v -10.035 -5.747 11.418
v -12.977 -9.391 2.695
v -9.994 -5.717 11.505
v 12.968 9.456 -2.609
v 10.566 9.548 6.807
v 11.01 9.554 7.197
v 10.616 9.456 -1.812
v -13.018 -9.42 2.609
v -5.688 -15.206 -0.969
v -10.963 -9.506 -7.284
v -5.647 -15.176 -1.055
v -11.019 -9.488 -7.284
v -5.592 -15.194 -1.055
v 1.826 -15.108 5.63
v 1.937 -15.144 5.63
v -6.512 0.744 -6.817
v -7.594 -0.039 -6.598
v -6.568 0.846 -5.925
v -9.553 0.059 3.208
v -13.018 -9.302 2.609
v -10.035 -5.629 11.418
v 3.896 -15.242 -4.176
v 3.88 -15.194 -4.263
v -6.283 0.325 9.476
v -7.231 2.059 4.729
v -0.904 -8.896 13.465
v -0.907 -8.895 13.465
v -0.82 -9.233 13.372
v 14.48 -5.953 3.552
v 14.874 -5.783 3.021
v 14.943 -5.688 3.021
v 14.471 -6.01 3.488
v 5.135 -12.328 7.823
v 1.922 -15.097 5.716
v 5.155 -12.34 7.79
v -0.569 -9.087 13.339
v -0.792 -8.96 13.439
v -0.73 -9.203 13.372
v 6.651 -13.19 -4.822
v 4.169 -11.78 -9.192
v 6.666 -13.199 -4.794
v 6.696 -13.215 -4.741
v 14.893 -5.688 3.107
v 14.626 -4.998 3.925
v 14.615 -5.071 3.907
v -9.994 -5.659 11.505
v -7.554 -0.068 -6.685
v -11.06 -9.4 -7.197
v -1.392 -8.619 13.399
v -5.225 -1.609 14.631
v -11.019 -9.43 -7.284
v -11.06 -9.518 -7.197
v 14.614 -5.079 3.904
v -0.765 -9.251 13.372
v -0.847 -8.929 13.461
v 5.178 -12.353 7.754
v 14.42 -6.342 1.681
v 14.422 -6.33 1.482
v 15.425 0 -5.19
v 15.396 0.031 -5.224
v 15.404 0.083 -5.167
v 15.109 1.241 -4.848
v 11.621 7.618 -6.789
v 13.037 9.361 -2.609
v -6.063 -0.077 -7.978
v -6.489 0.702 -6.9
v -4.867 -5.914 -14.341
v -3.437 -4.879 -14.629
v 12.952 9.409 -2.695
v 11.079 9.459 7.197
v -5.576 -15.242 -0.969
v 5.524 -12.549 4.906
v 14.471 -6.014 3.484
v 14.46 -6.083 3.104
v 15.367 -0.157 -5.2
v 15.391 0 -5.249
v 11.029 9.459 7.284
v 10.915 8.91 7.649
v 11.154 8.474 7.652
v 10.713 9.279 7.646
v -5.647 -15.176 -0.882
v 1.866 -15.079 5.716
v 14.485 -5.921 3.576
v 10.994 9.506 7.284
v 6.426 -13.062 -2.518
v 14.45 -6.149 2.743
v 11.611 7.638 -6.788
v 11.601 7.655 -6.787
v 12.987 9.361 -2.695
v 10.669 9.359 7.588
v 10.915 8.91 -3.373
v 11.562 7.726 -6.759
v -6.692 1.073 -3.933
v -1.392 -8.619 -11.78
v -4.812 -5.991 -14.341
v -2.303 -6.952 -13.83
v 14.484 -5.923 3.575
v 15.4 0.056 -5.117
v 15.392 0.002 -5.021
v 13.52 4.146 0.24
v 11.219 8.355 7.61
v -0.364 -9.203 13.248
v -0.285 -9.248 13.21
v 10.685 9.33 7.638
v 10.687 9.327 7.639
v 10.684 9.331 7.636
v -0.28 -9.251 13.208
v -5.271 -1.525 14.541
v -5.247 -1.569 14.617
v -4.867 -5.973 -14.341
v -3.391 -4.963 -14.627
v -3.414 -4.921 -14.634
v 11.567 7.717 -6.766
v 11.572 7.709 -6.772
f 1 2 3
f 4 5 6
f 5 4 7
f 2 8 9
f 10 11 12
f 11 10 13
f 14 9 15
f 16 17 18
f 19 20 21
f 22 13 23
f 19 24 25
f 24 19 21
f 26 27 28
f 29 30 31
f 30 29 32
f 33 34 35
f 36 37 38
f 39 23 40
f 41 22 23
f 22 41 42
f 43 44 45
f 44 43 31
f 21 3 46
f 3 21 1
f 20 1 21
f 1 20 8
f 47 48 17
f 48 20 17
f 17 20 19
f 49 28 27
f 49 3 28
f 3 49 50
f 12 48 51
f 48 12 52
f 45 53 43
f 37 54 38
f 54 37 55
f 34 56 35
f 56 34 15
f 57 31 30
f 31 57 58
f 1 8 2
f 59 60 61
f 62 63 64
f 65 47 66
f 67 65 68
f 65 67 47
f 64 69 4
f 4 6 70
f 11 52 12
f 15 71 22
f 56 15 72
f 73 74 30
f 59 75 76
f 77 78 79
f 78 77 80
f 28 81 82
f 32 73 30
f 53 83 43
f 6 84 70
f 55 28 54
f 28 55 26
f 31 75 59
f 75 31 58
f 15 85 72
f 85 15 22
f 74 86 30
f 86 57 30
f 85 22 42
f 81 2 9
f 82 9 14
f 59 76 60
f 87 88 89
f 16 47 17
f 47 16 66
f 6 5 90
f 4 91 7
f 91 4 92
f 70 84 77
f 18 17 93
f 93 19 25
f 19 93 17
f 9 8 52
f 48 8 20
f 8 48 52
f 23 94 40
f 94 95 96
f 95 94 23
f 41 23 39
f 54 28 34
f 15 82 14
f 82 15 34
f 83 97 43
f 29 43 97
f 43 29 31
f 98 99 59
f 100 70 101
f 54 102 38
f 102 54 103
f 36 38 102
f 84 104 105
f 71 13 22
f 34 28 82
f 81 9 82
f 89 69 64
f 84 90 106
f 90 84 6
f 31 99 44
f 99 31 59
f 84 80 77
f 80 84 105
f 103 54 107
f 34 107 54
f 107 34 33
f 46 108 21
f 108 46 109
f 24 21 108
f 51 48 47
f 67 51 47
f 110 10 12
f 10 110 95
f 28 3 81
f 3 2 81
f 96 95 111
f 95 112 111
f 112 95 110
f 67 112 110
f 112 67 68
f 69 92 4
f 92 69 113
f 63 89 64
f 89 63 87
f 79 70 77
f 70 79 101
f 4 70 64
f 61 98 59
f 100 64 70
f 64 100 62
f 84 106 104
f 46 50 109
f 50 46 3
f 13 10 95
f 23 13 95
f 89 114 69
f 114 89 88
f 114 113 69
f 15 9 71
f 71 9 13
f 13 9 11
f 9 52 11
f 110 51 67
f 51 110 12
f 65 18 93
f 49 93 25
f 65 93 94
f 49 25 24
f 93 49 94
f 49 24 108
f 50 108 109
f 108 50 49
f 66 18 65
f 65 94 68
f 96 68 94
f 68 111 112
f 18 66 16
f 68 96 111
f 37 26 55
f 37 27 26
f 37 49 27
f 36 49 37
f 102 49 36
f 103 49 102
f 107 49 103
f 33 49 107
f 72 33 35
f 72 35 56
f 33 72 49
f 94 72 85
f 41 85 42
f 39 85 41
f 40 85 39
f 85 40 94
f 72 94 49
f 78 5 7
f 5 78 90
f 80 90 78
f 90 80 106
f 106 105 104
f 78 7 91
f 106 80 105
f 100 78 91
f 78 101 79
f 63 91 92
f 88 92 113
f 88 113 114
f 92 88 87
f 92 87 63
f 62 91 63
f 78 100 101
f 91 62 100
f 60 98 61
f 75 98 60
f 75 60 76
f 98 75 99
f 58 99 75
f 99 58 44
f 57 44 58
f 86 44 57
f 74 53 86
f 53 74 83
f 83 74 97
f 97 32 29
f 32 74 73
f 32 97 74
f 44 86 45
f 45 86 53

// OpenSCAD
// Auto-generated OpenSCAD file

    inner_points = 10*[[3.624317002584078e-13, 2.953319001906976e-13, 1.618033988749895], [-3.624317002584078e-13, -2.953319001906976e-13, -1.618033988749895], [1.4067368092917045, -0.799453274515584, -1.6918183476653185e-13], [0.799453274515584, 1.4067368092917045, -4.358384739871853e-13], [-0.4563237566115435, 0.834432217941957, 1.3090169943748973], [-0.45632375661213, 0.8344322179414793, -1.3090169943749976], [0.45632375661213, -0.8344322179414793, 1.3090169943749976], [0.4563237566115435, -0.834432217941957, -1.3090169943748973], [0.9504130526801611, 0.03497894342637298, 1.309016994374728], [0.9504130526795745, 0.03497894342589519, -1.3090169943751668], [-0.7383473480718745, 1.350139689937751, 0.49999999999991895], [-0.7383473480720981, 1.3501396899375684, -0.500000000000081], [0.7383473480720981, -1.3501396899375684, 0.500000000000081], [0.7383473480718745, -1.350139689937751, -0.49999999999991895], [1.5378006225876821, 0.056597119354135916, 0.4999999999996452], [1.5378006225874585, 0.056597119353953396, -0.5000000000003548], [0.21206570460806262, 1.3851186333639414, 0.8090169943746471], [0.21206570460770024, 1.3851186333636463, -0.8090169943752478], [1.0814768659759149, 0.8910293372959104, 0.8090169943745426], [1.0814768659755525, 0.8910293372956152, -0.8090169943753523], [-0.8694111613678522, 0.49408929606803104, 1.0456012416478531e-13], [-0.5873875699075214, -0.02161817592776291, 0.809016994375083], [-0.5873875699078839, -0.021618175928058286, -0.8090169943748119], [-0.13106381329575384, -0.8560503938695374, 0.5000000000001856], [-0.13106381329597788, -0.8560503938697199, -0.49999999999981437]];

    outer_points = 10*[[-0.4827045868491299, -0.5943615441771533, -1.4253998124694895], [0.4827045868491299, 0.5943615441771533, 1.4253998124694895], [1.5325422089871936, 0.0, -0.5189878287807413], [0.19064272411334998, -1.5049147296618652, 0.56295736689317], [-1.097875476912321, -0.9458928165929492, -0.7197153641977476], [-0.31684304886495324, 0.01580436349155695, 1.5866299799356127], [0.31684304886495324, -0.01580436349155695, -1.5866299799356127], [1.097875476912321, 0.9458928165929492, 0.7197153641977476], [0.43466673207487266, -0.9458928165929492, -1.2387031929784889], [1.2156991601222404, 0.01580436349155695, 1.0676421511548713], [-1.2936952502100056, -0.9361251827846091, 0.2608758909720249], [-0.9953674090117679, -0.5687895468772561, 1.1418214226358954], [0.9953674090117679, 0.5687895468772561, -1.1418214226358954], [1.2936952502100056, 0.9361251827846091, -0.2608758909720249], [1.186010133125118, -0.9361251827846091, -0.5788640557427255], [1.4843379743233558, -0.5687895468772561, 0.3020814759211451], [-0.5607006769368953, -1.5146823634702054, -0.09688177034259327], [-0.07799609008776537, -0.9203208192930521, 1.3285180421268963], [0.38646249741103483, -1.5146823634702054, -0.4176338882766023], [0.8691670842601649, -0.9203208192930521, 1.0077659241928874], [-0.9471631743479302, 0.0, 0.32075211793400904], [-0.7513434010502453, -0.009767633808340115, -0.6598391372357633], [-0.26863881420111535, 0.5845939103688131, 0.7655606752337263], [0.04820423466383783, 0.5687895468772561, -0.8210693047018864], [0.34653207586207563, 0.9361251827846091, 0.059876226961984164]];

    // Convex hull for inner set (I)
    module inner_hull() {
        hull() {
            for (p = inner_points) {
                translate(p) sphere(r=0.1);
            }
        }
    }

    // Convex hull for outer set (O) minus inner hull (O \ I)
    module outer_minus_inner() {
        difference() {
            hull() {
                for (p = outer_points) {
                    translate(p) sphere(r=0.1);
                }
            }
            inner_hull(); // Subtract inner hull
        }
    }

    // Convex hull for outer set (O) minus all translated inner hulls
    module outer_minus_AllTranslationInner() {
        difference() {
            hull() {
                for (p = outer_points) {
                    translate(p) sphere(r=0.1);
                }
            }
            hull() {
                translate([0,0,50]) inner_hull();
                translate([0,0,-50]) inner_hull();
            }; // Subtract translated inner hulls
        }
    }

    // Difference between outer_minus_inner and outer_minus_AllTranslationInner
    module outer_minus_inner_diff() {
        difference() {
            // Outer minus inner
            difference() {
                hull() {
                    for (p = outer_points) {
                        translate(p) sphere(r=0.1);
                    }
                }
                inner_hull();
            }

            // Subtract Outer minus AllTranslationInner
            difference() {
                hull() {
                    for (p = outer_points) {
                        translate(p) sphere(r=0.1);
                    }
                }
                hull() {
                    translate([0,0,50]) inner_hull();
                    translate([0,0,-50]) inner_hull();
                };
            }
        }
    }

    // Rendering all with colors applied
    color([0, 1, 0, 1]) outer_minus_AllTranslationInner(); // Opaque green
    
